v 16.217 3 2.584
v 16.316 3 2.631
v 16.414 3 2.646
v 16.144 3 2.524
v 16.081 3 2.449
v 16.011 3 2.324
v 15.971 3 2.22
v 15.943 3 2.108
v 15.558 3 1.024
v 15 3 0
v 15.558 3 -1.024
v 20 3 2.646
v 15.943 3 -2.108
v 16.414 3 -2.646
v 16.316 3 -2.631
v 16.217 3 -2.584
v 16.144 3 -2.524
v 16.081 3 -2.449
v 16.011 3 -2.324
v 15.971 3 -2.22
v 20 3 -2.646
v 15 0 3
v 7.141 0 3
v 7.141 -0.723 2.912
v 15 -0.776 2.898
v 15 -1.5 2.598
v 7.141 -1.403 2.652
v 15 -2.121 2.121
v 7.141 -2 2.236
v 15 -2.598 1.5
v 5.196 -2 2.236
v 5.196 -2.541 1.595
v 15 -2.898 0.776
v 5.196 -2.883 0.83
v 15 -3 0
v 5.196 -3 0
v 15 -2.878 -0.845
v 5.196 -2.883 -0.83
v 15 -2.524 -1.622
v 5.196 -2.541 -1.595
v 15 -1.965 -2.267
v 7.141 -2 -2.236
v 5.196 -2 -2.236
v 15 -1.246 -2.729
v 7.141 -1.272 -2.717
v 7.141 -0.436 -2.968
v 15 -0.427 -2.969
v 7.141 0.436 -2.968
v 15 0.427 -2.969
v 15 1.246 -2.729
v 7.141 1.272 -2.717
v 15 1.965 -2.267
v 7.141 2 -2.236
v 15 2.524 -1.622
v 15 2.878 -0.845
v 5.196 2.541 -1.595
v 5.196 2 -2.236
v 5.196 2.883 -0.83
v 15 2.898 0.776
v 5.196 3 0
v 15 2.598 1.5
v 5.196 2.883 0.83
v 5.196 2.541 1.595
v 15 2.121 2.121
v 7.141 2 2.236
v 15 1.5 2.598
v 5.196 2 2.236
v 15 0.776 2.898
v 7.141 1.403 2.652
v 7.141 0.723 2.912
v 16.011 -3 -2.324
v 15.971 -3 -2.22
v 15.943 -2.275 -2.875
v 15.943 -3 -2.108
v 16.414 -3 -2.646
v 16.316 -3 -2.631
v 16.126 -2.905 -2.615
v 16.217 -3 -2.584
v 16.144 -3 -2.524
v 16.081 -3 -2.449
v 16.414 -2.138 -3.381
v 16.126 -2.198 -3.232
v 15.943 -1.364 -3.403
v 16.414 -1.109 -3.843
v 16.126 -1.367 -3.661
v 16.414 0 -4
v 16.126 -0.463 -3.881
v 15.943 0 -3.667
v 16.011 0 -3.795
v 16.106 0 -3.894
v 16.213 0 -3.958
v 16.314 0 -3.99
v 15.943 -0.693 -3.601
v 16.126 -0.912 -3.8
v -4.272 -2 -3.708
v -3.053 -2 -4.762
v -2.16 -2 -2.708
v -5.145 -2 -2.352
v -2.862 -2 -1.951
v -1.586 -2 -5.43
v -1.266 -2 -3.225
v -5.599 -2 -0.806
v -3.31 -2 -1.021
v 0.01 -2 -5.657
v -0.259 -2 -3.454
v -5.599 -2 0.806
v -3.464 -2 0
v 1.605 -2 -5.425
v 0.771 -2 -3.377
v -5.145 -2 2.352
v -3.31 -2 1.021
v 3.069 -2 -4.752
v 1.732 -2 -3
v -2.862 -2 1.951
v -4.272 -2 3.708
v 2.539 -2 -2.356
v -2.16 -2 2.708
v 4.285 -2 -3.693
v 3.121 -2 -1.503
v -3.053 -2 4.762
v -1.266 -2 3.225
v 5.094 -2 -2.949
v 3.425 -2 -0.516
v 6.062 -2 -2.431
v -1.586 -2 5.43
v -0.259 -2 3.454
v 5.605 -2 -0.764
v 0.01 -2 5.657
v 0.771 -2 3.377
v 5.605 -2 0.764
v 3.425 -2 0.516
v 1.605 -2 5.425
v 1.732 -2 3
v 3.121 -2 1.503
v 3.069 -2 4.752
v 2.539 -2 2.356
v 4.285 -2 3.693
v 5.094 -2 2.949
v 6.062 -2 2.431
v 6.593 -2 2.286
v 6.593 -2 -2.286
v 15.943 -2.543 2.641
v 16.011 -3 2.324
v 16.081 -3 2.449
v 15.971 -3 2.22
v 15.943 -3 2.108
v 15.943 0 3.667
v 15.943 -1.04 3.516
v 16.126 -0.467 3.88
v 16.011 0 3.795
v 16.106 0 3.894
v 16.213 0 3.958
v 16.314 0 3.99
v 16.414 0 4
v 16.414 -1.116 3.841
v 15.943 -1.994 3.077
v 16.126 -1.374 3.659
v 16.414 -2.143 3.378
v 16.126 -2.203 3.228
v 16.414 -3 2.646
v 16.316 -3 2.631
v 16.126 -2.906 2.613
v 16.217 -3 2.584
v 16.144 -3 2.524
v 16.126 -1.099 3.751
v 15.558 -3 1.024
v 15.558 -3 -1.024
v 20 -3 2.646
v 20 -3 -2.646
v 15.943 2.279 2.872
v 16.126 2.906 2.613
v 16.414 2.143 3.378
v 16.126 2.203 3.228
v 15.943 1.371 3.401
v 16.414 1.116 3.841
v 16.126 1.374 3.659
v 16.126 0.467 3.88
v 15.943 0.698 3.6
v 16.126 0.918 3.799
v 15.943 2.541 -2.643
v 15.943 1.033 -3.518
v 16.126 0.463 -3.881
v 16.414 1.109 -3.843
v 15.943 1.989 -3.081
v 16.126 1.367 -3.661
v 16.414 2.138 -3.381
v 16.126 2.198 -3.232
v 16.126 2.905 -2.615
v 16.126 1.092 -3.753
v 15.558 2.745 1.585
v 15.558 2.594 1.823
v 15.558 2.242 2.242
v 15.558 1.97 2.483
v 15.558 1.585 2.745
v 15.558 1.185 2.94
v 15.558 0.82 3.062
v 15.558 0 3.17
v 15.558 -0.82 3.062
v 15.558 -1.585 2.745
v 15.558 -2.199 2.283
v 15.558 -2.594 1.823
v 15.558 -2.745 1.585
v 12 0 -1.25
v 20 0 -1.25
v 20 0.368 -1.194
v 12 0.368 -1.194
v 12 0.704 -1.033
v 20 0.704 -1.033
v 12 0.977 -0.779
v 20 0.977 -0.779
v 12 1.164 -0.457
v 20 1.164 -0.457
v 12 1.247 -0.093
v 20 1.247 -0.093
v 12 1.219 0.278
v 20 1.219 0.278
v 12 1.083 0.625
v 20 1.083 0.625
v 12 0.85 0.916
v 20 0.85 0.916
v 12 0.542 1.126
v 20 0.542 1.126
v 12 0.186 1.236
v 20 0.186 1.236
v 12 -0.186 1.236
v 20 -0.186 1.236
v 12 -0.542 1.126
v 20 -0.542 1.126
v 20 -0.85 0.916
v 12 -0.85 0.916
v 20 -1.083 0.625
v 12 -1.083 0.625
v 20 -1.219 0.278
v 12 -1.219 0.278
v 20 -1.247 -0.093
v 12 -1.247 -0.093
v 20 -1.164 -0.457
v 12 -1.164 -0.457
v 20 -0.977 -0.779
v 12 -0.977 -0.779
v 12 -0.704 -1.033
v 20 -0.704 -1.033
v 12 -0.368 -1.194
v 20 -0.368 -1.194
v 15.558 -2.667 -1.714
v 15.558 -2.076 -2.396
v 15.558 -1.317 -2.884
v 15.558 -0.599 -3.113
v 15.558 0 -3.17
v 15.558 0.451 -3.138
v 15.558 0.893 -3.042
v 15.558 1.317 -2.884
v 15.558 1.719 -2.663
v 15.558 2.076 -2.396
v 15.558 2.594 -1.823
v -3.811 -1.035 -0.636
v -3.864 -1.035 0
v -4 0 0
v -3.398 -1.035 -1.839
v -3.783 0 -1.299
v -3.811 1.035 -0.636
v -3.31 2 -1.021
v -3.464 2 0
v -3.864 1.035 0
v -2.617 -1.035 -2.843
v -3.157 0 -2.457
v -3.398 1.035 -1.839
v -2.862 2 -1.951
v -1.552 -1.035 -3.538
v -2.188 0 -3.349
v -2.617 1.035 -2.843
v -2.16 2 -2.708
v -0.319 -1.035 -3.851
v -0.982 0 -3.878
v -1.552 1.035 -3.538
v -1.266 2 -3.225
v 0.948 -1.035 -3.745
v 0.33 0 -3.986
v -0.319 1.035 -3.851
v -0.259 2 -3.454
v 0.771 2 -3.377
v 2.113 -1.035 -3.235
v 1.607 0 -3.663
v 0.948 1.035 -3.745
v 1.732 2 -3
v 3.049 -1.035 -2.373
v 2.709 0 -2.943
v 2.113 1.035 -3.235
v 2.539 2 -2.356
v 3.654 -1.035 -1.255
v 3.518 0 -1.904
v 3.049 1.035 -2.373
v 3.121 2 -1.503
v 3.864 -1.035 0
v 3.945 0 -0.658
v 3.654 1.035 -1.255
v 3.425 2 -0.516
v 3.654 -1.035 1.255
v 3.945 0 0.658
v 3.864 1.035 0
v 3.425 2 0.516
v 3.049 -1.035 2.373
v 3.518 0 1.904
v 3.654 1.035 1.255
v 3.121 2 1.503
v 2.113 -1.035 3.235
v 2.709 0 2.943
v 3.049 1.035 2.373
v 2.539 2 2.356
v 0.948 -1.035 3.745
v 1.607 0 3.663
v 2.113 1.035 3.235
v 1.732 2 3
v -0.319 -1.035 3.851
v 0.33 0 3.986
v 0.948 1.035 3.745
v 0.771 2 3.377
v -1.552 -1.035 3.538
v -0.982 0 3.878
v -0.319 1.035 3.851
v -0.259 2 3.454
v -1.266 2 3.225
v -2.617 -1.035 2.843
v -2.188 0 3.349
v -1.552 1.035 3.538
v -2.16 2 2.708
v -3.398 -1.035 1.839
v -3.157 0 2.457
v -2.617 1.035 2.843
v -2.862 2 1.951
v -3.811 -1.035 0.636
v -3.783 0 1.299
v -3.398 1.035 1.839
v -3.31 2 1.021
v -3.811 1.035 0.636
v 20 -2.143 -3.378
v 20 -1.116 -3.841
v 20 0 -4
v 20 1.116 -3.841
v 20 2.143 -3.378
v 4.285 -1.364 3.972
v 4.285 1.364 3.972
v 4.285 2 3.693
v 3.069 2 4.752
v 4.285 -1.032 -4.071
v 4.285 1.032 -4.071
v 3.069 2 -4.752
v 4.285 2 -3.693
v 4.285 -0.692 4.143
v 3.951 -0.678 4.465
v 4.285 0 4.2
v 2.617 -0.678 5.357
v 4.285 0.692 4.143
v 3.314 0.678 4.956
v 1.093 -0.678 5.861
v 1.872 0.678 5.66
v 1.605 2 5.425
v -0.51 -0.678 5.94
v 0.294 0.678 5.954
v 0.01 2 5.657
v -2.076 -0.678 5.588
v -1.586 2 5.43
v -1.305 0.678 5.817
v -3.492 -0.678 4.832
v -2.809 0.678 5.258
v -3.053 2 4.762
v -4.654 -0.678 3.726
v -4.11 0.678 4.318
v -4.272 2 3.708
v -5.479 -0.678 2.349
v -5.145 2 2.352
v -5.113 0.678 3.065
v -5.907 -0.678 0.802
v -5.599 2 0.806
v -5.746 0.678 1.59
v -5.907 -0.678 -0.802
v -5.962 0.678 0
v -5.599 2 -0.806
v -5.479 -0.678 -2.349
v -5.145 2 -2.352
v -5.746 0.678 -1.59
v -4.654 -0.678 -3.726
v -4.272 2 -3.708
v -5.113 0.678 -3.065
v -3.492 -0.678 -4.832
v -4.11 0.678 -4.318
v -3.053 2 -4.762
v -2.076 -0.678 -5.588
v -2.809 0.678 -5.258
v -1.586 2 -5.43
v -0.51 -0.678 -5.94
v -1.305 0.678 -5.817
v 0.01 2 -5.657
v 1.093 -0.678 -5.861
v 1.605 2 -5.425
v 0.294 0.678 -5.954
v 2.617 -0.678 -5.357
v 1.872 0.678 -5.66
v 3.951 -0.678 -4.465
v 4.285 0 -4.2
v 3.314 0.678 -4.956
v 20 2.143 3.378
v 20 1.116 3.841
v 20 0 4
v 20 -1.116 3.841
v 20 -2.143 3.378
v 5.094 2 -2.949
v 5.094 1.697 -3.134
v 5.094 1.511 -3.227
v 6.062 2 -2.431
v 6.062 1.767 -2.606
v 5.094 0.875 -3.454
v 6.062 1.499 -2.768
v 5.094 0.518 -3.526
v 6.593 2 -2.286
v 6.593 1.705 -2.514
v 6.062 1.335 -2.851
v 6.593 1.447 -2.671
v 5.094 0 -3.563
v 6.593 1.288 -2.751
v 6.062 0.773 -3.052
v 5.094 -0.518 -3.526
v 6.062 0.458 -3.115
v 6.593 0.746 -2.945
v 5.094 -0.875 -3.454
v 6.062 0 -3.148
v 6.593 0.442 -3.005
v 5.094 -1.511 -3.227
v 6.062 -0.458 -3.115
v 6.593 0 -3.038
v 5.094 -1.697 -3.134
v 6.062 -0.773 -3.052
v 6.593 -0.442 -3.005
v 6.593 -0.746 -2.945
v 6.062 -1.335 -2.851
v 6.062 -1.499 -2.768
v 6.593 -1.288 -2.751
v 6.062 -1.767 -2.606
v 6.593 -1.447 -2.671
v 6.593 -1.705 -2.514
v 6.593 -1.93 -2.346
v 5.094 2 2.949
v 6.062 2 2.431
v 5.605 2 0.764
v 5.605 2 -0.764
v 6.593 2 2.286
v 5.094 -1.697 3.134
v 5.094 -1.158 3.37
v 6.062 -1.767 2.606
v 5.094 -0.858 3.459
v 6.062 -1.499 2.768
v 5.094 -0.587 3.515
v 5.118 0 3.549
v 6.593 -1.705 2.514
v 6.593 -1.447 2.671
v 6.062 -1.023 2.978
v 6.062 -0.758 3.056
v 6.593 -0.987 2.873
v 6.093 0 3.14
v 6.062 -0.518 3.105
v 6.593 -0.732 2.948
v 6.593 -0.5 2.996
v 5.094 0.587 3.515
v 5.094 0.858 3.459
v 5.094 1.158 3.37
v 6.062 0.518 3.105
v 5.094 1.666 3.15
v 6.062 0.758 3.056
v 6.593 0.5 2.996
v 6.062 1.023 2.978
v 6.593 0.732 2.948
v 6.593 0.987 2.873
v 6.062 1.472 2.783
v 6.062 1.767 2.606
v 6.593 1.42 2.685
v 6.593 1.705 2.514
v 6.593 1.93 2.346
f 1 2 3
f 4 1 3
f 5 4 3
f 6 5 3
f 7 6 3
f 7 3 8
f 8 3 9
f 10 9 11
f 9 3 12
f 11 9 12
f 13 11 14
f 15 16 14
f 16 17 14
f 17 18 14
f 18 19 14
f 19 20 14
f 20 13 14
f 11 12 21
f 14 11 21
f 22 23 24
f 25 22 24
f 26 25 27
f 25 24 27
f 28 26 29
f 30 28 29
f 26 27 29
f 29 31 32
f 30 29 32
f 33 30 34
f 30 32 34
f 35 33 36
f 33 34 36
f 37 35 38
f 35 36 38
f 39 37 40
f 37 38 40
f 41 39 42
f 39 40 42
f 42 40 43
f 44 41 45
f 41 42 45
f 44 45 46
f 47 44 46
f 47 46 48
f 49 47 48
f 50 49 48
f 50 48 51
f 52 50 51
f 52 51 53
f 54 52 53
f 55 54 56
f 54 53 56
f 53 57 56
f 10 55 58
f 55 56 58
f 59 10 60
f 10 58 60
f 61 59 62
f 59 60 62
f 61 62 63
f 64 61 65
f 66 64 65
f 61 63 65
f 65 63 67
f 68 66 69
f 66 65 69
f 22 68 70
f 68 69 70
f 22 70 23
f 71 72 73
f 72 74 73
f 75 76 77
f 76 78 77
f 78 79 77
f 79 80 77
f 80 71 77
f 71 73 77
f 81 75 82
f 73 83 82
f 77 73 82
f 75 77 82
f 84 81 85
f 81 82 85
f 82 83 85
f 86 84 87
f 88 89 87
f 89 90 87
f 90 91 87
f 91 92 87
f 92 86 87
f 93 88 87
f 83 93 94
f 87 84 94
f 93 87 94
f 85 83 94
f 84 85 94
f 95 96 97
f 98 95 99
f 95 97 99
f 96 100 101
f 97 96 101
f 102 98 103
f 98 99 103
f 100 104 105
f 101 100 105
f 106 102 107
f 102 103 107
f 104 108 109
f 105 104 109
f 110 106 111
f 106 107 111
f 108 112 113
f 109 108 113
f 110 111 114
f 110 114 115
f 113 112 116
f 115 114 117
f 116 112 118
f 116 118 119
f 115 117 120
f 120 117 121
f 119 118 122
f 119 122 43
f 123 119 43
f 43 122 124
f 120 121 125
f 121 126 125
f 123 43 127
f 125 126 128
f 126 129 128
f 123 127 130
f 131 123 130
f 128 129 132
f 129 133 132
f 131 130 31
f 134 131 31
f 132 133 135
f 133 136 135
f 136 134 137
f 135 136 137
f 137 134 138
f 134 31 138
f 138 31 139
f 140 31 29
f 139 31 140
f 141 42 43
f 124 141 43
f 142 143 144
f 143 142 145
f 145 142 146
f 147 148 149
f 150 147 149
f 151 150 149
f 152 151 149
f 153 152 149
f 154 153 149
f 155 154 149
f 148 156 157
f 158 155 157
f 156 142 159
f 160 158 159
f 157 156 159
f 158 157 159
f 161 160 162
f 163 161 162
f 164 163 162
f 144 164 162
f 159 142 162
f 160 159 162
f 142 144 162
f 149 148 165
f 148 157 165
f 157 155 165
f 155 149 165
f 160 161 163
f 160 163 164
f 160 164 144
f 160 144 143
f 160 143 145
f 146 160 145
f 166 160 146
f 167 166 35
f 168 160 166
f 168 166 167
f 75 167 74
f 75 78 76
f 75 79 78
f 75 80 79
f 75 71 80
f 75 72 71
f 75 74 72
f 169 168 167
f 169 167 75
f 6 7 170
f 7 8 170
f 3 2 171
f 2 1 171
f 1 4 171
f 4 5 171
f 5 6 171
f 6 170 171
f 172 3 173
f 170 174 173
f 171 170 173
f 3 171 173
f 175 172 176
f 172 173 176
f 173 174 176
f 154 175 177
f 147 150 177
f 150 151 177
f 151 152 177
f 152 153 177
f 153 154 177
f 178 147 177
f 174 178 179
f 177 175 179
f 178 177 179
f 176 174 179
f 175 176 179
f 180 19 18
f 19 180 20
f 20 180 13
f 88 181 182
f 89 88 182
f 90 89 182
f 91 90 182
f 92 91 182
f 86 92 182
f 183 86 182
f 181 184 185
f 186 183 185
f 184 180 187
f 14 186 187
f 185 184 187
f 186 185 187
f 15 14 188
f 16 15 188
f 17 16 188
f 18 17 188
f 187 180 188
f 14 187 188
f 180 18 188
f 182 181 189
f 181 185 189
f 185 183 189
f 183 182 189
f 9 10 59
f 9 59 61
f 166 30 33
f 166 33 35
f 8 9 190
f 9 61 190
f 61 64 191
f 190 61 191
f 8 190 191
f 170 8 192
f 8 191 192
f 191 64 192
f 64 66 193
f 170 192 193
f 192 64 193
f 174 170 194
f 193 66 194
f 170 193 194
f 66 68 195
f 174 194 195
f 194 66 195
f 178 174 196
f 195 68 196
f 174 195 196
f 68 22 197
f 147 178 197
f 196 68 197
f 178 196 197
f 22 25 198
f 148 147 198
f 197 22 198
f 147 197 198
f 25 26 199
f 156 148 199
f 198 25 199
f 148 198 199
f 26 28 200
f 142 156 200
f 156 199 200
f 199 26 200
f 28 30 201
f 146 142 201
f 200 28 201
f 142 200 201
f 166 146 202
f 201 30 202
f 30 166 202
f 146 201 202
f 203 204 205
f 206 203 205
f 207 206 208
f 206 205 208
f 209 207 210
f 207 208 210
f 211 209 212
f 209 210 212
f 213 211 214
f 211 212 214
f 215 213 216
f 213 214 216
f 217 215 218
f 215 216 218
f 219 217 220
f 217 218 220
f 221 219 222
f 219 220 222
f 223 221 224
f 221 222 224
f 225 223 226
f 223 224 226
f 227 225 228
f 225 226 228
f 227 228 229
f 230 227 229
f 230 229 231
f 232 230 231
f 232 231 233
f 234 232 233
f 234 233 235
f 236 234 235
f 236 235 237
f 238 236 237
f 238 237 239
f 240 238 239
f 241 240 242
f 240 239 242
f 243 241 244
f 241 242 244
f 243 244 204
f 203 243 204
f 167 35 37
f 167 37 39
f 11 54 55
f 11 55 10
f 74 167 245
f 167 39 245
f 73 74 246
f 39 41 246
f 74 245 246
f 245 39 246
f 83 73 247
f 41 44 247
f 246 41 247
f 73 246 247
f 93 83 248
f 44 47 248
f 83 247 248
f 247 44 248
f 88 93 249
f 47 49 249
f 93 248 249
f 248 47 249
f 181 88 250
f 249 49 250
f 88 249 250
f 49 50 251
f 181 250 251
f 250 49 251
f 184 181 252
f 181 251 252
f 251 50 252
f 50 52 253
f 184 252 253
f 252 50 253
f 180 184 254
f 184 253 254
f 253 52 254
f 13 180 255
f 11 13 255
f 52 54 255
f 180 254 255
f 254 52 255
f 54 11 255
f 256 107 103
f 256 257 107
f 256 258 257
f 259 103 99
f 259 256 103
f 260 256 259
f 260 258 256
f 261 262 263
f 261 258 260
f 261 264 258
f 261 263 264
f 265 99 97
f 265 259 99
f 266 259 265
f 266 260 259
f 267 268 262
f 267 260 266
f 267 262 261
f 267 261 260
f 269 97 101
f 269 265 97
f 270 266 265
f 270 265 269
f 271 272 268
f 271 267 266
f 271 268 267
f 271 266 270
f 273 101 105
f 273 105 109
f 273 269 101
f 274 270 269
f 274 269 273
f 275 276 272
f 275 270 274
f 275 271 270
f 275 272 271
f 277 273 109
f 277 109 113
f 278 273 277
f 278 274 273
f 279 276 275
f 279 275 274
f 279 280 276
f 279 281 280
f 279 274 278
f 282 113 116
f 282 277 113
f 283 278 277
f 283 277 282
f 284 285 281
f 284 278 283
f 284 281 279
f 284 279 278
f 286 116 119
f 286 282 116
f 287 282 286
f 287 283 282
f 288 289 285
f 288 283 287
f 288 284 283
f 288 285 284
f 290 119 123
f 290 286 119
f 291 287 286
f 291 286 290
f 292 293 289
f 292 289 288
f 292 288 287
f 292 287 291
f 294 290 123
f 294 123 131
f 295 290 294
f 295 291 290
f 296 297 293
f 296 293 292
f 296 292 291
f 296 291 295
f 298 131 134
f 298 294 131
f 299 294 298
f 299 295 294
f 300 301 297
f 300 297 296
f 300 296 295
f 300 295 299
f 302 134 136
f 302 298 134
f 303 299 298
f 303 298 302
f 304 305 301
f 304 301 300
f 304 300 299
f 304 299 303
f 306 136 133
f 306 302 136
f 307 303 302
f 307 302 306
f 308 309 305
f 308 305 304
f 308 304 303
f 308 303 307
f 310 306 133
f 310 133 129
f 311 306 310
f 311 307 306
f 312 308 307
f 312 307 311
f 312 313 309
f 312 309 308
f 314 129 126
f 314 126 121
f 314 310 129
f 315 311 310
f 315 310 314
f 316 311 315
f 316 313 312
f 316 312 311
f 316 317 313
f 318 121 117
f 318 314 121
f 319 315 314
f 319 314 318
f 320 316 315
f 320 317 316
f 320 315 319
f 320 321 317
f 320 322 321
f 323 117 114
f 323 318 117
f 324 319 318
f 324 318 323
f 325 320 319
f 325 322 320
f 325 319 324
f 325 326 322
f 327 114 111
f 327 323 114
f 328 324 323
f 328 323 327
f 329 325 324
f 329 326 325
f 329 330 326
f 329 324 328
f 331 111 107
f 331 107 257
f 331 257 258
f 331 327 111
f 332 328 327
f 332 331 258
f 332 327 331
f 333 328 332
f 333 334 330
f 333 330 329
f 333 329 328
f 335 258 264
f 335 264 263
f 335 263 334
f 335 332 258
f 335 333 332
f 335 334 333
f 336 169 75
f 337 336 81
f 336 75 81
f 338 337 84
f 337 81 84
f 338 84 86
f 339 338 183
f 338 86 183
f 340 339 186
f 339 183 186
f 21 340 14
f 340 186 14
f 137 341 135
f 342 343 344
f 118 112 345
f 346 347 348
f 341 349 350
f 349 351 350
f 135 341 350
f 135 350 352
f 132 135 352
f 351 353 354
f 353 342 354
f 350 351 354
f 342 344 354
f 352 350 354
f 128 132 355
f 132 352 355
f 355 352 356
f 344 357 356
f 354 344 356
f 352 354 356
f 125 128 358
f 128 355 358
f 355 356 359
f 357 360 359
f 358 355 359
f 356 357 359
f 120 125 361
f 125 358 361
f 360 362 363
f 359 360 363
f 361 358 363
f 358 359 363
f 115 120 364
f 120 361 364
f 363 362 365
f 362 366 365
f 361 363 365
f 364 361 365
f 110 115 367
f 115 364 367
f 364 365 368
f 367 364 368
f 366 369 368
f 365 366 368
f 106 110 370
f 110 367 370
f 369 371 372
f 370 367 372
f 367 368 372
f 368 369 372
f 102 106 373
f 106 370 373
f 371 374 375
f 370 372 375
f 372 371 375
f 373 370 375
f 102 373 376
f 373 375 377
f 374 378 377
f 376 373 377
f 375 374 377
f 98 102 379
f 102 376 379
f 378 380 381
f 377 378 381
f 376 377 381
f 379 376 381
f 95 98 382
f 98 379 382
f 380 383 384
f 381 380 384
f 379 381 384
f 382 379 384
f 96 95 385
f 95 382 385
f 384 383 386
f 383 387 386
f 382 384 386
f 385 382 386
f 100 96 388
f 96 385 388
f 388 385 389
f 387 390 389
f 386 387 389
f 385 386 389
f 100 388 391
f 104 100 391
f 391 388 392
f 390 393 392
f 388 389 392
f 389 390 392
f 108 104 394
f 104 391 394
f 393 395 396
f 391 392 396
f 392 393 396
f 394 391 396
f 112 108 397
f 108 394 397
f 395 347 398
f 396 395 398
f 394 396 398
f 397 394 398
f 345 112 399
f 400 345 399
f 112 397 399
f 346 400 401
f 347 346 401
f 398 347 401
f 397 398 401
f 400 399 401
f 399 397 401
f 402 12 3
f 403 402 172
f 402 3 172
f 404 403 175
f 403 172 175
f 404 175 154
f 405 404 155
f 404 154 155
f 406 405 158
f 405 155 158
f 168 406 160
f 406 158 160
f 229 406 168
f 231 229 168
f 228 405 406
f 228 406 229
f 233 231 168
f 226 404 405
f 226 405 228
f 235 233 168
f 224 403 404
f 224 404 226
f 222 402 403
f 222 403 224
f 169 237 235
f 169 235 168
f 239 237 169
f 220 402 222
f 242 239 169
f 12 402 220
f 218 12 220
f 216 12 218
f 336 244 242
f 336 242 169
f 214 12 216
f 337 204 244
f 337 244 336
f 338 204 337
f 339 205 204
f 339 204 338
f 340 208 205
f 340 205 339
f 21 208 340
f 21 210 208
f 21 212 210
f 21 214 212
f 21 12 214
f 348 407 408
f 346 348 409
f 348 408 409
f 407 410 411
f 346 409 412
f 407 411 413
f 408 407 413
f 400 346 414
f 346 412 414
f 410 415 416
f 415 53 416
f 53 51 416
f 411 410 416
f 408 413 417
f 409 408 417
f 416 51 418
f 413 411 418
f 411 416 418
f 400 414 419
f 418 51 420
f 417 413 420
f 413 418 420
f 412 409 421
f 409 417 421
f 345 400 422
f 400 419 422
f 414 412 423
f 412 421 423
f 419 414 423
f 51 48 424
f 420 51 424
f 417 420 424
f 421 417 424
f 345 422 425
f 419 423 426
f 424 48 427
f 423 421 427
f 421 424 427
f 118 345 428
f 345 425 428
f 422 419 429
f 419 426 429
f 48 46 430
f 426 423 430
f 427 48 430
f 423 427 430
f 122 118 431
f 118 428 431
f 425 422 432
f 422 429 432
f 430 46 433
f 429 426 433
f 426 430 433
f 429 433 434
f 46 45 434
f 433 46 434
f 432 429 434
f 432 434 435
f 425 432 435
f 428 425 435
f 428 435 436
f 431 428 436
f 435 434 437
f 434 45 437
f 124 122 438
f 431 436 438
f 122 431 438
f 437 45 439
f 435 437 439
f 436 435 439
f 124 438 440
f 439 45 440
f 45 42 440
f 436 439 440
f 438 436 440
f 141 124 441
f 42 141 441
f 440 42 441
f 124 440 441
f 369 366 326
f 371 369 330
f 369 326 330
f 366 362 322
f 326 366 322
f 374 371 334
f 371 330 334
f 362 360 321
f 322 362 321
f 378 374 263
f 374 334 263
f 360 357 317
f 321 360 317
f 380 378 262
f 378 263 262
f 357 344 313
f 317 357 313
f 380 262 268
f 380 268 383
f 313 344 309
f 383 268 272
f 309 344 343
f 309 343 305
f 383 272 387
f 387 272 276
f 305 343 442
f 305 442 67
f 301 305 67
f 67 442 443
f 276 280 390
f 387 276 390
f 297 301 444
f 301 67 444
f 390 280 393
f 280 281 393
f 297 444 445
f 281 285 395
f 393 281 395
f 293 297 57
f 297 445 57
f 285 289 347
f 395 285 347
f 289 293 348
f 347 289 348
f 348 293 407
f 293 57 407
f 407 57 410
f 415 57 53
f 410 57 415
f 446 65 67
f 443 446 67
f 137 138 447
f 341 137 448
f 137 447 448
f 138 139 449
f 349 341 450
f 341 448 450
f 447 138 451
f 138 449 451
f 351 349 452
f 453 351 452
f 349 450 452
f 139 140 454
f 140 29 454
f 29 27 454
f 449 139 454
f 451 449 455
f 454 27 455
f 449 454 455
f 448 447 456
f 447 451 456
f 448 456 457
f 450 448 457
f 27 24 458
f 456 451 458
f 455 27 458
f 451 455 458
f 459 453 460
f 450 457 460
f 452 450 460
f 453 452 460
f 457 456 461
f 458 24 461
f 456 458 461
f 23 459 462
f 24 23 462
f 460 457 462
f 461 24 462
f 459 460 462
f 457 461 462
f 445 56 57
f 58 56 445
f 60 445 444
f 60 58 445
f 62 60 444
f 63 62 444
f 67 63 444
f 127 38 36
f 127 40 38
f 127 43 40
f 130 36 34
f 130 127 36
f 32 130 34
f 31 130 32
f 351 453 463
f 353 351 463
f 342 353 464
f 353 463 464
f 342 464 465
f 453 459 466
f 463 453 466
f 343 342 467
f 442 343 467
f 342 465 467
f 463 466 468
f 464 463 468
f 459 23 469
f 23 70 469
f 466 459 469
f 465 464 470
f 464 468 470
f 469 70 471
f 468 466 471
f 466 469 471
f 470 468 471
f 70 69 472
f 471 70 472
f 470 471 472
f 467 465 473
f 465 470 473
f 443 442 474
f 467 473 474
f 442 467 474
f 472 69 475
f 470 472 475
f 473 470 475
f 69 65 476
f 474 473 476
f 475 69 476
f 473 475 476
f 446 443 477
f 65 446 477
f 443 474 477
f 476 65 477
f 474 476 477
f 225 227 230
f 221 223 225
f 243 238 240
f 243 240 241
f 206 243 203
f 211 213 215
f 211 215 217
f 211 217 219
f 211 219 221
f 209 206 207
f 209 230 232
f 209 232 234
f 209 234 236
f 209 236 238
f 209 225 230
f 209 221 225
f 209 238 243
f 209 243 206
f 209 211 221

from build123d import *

# Parameters (mm, degrees)
SKETCH_2_R          = 3
EXTRUDE_1_DEPTH     = 16
SKETCH_6_R          = 4
EXTRUDE_2_DEPTH     = 4
FILLET_1_R          = 1
FILLET_2_R          = 0.5
CUT_EXTRUDE_1_DEPTH = 27.981475869
FILLET_3_R          = 4
SKETCH_8_R          = 1.25
CUT_EXTRUDE_2_DEPTH = 8


# Some blends are built 0.0001 mm under size
with BuildPart() as part:
    # 草图1 → 旋转1 (revolve)
    with BuildSketch(Plane.XY):
        with BuildLine():
            Line((0, 6), (0, -6))
            ThreePointArc((0, -6), (6, 0), (0, 6))
        make_face()
    revolve(axis=Axis((0, 6, 0), (0, -1, 0)))

    # 草图2 → 凸台-拉伸1 (add)
    with BuildSketch(Plane(origin=(0, 0, 0), x_dir=(0, 0, -1), z_dir=(1, 0, 0))):
        with Locations(Location((0, 0, 0), (0, 0, 180))):
            Circle(SKETCH_2_R)
    extrude(amount=EXTRUDE_1_DEPTH)

    # 草图4 → 切除-旋转1 (revolve, cut)
    with BuildSketch(Plane.XY):
        with BuildLine():
            Line((0, 6), (0, -6))
            ThreePointArc((0, -6), (-3.464101615, -4.898979486), (-5.656854249, -2))
            Line((-5.656854249, -2), (-3.464101615, -2))
            ThreePointArc((-3.464101615, -2), (-4, 0), (-3.464101615, 2))
            Line((-3.464101615, 2), (-5.656854249, 2))
            ThreePointArc((-5.656854249, 2), (-3.464101615, 4.898979486), (0, 6))
        make_face()
    revolve(axis=Axis((0, 13.897588957, 0), (0, -1, 0)), mode=Mode.SUBTRACT)

    # 草图6 → 凸台-拉伸2 (add)
    with BuildSketch(Plane(origin=(16, 0, 0), x_dir=(0, 0, -1), z_dir=(1, 0, 0))):
        Circle(SKETCH_6_R)
    extrude(amount=EXTRUDE_2_DEPTH)

    # 圆角1
    fillet_1_edges = [part.edges().sort_by_distance(p)[0] for p in [
        (16, 0, -3),
    ]]
    fillet(fillet_1_edges, radius=FILLET_1_R - 0.0001)  # a hair under: the kernel refuses the full size

    # 圆角2
    fillet_2_edges = [part.edges().sort_by_distance(p)[0] for p in [
        (16, 0, 4),
    ]]
    fillet(fillet_2_edges, radius=FILLET_2_R)

    # 草图7 → 切除-拉伸1 (cut, through all)
    with BuildSketch(Plane(origin=(20, 0, 0), x_dir=(0, 0, -1), z_dir=(1, 0, 0))):
        with BuildLine():
            Line((-2.645751311, 3), (2.645751311, 3))
            ThreePointArc((2.645751311, 3), (0, 4), (-2.645751311, 3))
        make_face()
        with BuildLine():
            Line((-2.645751311, -3), (2.645751311, -3))
            ThreePointArc((2.645751311, -3), (0, -4), (-2.645751311, -3))
        make_face()
    extrude(amount=-CUT_EXTRUDE_1_DEPTH, mode=Mode.SUBTRACT)

    # 圆角3
    # the kernel refuses this fillet: 4 mm, written as the material it adds along each edge
    with BuildSketch(Plane(origin=(5.196152423, 0, 0), x_dir=(0, 0.710521844411638, 0.7036751442348125), z_dir=(0, -0.7036751442348125, 0.710521844411638))) as fillet_3_piece_1_section:
        with BuildLine():
            CenterArc((7, -1.945276006), FILLET_3_R, 134.427004001, 45.572995999)
            ThreePointArc((4.2, 0.911295366), (3.628720823, 0.417827906), (3, 0))
            Line((3, 0), (3, -1.945276006))
        make_face()
    fillet_3_piece_1 = revolve(axis=Axis((5.196152423, 0, 0), (-1, 0, 0)), revolution_arc=269.445220203, mode=Mode.PRIVATE)
    fillet_3_piece_1 = split(fillet_3_piece_1, bisect_by=Plane(origin=(5.196152423, -2, 0), z_dir=(0, 1, 0)), keep=Keep.TOP, mode=Mode.PRIVATE)
    fillet_3_piece_1 = split(fillet_3_piece_1, bisect_by=Plane(origin=(5.196152423, 2, 0), z_dir=(0, -1, 0)), keep=Keep.TOP, mode=Mode.PRIVATE)
    add(fillet_3_piece_1)
    with BuildSketch(Plane(origin=(5.196152423, 0, 0), x_dir=(0, -0.7108184662614588, -0.7033755099672631), z_dir=(0, 0.7033755099672631, -0.7108184662614588))) as fillet_3_piece_2_section:
        with BuildLine():
            CenterArc((7, -1.945276006), FILLET_3_R, 134.427004001, 45.572995999)
            ThreePointArc((4.2, 0.911295366), (3.628720823, 0.417827906), (3, 0))
            Line((3, 0), (3, -1.945276006))
        make_face()
    fillet_3_piece_2 = revolve(axis=Axis((5.196152423, 0, 0), (-1, 0, 0)), revolution_arc=134.698452933, mode=Mode.PRIVATE)
    fillet_3_piece_2 = split(fillet_3_piece_2, bisect_by=Plane(origin=(5.196152423, -2, 0), z_dir=(0, 1, 0)), keep=Keep.TOP, mode=Mode.PRIVATE)
    add(fillet_3_piece_2)
    with BuildSketch(Plane(origin=(5.196152423, 0, 0), x_dir=(0, 0, 1), z_dir=(0, -1, 0))) as fillet_3_piece_3_section:
        with BuildLine():
            CenterArc((7, -1.945276006), FILLET_3_R, 134.427004001, 45.572995999)
            ThreePointArc((4.2, 0.911295366), (3.628720823, 0.417827906), (3, 0))
            Line((3, 0), (3, -1.945276006))
        make_face()
    fillet_3_piece_3 = revolve(axis=Axis((5.196152423, 0, 0), (-1, 0, 0)), revolution_arc=134.698452933, mode=Mode.PRIVATE)
    fillet_3_piece_3 = split(fillet_3_piece_3, bisect_by=Plane(origin=(5.196152423, 2, 0), z_dir=(0, -1, 0)), keep=Keep.TOP, mode=Mode.PRIVATE)
    add(fillet_3_piece_3)

    # 草图8 → 切除-拉伸2 (cut)
    with BuildSketch(Plane(origin=(20, 0, 0), x_dir=(0, 0, -1), z_dir=(1, 0, 0))):
        Circle(SKETCH_8_R)
    extrude(amount=-CUT_EXTRUDE_2_DEPTH, mode=Mode.SUBTRACT)


solid = part.part
